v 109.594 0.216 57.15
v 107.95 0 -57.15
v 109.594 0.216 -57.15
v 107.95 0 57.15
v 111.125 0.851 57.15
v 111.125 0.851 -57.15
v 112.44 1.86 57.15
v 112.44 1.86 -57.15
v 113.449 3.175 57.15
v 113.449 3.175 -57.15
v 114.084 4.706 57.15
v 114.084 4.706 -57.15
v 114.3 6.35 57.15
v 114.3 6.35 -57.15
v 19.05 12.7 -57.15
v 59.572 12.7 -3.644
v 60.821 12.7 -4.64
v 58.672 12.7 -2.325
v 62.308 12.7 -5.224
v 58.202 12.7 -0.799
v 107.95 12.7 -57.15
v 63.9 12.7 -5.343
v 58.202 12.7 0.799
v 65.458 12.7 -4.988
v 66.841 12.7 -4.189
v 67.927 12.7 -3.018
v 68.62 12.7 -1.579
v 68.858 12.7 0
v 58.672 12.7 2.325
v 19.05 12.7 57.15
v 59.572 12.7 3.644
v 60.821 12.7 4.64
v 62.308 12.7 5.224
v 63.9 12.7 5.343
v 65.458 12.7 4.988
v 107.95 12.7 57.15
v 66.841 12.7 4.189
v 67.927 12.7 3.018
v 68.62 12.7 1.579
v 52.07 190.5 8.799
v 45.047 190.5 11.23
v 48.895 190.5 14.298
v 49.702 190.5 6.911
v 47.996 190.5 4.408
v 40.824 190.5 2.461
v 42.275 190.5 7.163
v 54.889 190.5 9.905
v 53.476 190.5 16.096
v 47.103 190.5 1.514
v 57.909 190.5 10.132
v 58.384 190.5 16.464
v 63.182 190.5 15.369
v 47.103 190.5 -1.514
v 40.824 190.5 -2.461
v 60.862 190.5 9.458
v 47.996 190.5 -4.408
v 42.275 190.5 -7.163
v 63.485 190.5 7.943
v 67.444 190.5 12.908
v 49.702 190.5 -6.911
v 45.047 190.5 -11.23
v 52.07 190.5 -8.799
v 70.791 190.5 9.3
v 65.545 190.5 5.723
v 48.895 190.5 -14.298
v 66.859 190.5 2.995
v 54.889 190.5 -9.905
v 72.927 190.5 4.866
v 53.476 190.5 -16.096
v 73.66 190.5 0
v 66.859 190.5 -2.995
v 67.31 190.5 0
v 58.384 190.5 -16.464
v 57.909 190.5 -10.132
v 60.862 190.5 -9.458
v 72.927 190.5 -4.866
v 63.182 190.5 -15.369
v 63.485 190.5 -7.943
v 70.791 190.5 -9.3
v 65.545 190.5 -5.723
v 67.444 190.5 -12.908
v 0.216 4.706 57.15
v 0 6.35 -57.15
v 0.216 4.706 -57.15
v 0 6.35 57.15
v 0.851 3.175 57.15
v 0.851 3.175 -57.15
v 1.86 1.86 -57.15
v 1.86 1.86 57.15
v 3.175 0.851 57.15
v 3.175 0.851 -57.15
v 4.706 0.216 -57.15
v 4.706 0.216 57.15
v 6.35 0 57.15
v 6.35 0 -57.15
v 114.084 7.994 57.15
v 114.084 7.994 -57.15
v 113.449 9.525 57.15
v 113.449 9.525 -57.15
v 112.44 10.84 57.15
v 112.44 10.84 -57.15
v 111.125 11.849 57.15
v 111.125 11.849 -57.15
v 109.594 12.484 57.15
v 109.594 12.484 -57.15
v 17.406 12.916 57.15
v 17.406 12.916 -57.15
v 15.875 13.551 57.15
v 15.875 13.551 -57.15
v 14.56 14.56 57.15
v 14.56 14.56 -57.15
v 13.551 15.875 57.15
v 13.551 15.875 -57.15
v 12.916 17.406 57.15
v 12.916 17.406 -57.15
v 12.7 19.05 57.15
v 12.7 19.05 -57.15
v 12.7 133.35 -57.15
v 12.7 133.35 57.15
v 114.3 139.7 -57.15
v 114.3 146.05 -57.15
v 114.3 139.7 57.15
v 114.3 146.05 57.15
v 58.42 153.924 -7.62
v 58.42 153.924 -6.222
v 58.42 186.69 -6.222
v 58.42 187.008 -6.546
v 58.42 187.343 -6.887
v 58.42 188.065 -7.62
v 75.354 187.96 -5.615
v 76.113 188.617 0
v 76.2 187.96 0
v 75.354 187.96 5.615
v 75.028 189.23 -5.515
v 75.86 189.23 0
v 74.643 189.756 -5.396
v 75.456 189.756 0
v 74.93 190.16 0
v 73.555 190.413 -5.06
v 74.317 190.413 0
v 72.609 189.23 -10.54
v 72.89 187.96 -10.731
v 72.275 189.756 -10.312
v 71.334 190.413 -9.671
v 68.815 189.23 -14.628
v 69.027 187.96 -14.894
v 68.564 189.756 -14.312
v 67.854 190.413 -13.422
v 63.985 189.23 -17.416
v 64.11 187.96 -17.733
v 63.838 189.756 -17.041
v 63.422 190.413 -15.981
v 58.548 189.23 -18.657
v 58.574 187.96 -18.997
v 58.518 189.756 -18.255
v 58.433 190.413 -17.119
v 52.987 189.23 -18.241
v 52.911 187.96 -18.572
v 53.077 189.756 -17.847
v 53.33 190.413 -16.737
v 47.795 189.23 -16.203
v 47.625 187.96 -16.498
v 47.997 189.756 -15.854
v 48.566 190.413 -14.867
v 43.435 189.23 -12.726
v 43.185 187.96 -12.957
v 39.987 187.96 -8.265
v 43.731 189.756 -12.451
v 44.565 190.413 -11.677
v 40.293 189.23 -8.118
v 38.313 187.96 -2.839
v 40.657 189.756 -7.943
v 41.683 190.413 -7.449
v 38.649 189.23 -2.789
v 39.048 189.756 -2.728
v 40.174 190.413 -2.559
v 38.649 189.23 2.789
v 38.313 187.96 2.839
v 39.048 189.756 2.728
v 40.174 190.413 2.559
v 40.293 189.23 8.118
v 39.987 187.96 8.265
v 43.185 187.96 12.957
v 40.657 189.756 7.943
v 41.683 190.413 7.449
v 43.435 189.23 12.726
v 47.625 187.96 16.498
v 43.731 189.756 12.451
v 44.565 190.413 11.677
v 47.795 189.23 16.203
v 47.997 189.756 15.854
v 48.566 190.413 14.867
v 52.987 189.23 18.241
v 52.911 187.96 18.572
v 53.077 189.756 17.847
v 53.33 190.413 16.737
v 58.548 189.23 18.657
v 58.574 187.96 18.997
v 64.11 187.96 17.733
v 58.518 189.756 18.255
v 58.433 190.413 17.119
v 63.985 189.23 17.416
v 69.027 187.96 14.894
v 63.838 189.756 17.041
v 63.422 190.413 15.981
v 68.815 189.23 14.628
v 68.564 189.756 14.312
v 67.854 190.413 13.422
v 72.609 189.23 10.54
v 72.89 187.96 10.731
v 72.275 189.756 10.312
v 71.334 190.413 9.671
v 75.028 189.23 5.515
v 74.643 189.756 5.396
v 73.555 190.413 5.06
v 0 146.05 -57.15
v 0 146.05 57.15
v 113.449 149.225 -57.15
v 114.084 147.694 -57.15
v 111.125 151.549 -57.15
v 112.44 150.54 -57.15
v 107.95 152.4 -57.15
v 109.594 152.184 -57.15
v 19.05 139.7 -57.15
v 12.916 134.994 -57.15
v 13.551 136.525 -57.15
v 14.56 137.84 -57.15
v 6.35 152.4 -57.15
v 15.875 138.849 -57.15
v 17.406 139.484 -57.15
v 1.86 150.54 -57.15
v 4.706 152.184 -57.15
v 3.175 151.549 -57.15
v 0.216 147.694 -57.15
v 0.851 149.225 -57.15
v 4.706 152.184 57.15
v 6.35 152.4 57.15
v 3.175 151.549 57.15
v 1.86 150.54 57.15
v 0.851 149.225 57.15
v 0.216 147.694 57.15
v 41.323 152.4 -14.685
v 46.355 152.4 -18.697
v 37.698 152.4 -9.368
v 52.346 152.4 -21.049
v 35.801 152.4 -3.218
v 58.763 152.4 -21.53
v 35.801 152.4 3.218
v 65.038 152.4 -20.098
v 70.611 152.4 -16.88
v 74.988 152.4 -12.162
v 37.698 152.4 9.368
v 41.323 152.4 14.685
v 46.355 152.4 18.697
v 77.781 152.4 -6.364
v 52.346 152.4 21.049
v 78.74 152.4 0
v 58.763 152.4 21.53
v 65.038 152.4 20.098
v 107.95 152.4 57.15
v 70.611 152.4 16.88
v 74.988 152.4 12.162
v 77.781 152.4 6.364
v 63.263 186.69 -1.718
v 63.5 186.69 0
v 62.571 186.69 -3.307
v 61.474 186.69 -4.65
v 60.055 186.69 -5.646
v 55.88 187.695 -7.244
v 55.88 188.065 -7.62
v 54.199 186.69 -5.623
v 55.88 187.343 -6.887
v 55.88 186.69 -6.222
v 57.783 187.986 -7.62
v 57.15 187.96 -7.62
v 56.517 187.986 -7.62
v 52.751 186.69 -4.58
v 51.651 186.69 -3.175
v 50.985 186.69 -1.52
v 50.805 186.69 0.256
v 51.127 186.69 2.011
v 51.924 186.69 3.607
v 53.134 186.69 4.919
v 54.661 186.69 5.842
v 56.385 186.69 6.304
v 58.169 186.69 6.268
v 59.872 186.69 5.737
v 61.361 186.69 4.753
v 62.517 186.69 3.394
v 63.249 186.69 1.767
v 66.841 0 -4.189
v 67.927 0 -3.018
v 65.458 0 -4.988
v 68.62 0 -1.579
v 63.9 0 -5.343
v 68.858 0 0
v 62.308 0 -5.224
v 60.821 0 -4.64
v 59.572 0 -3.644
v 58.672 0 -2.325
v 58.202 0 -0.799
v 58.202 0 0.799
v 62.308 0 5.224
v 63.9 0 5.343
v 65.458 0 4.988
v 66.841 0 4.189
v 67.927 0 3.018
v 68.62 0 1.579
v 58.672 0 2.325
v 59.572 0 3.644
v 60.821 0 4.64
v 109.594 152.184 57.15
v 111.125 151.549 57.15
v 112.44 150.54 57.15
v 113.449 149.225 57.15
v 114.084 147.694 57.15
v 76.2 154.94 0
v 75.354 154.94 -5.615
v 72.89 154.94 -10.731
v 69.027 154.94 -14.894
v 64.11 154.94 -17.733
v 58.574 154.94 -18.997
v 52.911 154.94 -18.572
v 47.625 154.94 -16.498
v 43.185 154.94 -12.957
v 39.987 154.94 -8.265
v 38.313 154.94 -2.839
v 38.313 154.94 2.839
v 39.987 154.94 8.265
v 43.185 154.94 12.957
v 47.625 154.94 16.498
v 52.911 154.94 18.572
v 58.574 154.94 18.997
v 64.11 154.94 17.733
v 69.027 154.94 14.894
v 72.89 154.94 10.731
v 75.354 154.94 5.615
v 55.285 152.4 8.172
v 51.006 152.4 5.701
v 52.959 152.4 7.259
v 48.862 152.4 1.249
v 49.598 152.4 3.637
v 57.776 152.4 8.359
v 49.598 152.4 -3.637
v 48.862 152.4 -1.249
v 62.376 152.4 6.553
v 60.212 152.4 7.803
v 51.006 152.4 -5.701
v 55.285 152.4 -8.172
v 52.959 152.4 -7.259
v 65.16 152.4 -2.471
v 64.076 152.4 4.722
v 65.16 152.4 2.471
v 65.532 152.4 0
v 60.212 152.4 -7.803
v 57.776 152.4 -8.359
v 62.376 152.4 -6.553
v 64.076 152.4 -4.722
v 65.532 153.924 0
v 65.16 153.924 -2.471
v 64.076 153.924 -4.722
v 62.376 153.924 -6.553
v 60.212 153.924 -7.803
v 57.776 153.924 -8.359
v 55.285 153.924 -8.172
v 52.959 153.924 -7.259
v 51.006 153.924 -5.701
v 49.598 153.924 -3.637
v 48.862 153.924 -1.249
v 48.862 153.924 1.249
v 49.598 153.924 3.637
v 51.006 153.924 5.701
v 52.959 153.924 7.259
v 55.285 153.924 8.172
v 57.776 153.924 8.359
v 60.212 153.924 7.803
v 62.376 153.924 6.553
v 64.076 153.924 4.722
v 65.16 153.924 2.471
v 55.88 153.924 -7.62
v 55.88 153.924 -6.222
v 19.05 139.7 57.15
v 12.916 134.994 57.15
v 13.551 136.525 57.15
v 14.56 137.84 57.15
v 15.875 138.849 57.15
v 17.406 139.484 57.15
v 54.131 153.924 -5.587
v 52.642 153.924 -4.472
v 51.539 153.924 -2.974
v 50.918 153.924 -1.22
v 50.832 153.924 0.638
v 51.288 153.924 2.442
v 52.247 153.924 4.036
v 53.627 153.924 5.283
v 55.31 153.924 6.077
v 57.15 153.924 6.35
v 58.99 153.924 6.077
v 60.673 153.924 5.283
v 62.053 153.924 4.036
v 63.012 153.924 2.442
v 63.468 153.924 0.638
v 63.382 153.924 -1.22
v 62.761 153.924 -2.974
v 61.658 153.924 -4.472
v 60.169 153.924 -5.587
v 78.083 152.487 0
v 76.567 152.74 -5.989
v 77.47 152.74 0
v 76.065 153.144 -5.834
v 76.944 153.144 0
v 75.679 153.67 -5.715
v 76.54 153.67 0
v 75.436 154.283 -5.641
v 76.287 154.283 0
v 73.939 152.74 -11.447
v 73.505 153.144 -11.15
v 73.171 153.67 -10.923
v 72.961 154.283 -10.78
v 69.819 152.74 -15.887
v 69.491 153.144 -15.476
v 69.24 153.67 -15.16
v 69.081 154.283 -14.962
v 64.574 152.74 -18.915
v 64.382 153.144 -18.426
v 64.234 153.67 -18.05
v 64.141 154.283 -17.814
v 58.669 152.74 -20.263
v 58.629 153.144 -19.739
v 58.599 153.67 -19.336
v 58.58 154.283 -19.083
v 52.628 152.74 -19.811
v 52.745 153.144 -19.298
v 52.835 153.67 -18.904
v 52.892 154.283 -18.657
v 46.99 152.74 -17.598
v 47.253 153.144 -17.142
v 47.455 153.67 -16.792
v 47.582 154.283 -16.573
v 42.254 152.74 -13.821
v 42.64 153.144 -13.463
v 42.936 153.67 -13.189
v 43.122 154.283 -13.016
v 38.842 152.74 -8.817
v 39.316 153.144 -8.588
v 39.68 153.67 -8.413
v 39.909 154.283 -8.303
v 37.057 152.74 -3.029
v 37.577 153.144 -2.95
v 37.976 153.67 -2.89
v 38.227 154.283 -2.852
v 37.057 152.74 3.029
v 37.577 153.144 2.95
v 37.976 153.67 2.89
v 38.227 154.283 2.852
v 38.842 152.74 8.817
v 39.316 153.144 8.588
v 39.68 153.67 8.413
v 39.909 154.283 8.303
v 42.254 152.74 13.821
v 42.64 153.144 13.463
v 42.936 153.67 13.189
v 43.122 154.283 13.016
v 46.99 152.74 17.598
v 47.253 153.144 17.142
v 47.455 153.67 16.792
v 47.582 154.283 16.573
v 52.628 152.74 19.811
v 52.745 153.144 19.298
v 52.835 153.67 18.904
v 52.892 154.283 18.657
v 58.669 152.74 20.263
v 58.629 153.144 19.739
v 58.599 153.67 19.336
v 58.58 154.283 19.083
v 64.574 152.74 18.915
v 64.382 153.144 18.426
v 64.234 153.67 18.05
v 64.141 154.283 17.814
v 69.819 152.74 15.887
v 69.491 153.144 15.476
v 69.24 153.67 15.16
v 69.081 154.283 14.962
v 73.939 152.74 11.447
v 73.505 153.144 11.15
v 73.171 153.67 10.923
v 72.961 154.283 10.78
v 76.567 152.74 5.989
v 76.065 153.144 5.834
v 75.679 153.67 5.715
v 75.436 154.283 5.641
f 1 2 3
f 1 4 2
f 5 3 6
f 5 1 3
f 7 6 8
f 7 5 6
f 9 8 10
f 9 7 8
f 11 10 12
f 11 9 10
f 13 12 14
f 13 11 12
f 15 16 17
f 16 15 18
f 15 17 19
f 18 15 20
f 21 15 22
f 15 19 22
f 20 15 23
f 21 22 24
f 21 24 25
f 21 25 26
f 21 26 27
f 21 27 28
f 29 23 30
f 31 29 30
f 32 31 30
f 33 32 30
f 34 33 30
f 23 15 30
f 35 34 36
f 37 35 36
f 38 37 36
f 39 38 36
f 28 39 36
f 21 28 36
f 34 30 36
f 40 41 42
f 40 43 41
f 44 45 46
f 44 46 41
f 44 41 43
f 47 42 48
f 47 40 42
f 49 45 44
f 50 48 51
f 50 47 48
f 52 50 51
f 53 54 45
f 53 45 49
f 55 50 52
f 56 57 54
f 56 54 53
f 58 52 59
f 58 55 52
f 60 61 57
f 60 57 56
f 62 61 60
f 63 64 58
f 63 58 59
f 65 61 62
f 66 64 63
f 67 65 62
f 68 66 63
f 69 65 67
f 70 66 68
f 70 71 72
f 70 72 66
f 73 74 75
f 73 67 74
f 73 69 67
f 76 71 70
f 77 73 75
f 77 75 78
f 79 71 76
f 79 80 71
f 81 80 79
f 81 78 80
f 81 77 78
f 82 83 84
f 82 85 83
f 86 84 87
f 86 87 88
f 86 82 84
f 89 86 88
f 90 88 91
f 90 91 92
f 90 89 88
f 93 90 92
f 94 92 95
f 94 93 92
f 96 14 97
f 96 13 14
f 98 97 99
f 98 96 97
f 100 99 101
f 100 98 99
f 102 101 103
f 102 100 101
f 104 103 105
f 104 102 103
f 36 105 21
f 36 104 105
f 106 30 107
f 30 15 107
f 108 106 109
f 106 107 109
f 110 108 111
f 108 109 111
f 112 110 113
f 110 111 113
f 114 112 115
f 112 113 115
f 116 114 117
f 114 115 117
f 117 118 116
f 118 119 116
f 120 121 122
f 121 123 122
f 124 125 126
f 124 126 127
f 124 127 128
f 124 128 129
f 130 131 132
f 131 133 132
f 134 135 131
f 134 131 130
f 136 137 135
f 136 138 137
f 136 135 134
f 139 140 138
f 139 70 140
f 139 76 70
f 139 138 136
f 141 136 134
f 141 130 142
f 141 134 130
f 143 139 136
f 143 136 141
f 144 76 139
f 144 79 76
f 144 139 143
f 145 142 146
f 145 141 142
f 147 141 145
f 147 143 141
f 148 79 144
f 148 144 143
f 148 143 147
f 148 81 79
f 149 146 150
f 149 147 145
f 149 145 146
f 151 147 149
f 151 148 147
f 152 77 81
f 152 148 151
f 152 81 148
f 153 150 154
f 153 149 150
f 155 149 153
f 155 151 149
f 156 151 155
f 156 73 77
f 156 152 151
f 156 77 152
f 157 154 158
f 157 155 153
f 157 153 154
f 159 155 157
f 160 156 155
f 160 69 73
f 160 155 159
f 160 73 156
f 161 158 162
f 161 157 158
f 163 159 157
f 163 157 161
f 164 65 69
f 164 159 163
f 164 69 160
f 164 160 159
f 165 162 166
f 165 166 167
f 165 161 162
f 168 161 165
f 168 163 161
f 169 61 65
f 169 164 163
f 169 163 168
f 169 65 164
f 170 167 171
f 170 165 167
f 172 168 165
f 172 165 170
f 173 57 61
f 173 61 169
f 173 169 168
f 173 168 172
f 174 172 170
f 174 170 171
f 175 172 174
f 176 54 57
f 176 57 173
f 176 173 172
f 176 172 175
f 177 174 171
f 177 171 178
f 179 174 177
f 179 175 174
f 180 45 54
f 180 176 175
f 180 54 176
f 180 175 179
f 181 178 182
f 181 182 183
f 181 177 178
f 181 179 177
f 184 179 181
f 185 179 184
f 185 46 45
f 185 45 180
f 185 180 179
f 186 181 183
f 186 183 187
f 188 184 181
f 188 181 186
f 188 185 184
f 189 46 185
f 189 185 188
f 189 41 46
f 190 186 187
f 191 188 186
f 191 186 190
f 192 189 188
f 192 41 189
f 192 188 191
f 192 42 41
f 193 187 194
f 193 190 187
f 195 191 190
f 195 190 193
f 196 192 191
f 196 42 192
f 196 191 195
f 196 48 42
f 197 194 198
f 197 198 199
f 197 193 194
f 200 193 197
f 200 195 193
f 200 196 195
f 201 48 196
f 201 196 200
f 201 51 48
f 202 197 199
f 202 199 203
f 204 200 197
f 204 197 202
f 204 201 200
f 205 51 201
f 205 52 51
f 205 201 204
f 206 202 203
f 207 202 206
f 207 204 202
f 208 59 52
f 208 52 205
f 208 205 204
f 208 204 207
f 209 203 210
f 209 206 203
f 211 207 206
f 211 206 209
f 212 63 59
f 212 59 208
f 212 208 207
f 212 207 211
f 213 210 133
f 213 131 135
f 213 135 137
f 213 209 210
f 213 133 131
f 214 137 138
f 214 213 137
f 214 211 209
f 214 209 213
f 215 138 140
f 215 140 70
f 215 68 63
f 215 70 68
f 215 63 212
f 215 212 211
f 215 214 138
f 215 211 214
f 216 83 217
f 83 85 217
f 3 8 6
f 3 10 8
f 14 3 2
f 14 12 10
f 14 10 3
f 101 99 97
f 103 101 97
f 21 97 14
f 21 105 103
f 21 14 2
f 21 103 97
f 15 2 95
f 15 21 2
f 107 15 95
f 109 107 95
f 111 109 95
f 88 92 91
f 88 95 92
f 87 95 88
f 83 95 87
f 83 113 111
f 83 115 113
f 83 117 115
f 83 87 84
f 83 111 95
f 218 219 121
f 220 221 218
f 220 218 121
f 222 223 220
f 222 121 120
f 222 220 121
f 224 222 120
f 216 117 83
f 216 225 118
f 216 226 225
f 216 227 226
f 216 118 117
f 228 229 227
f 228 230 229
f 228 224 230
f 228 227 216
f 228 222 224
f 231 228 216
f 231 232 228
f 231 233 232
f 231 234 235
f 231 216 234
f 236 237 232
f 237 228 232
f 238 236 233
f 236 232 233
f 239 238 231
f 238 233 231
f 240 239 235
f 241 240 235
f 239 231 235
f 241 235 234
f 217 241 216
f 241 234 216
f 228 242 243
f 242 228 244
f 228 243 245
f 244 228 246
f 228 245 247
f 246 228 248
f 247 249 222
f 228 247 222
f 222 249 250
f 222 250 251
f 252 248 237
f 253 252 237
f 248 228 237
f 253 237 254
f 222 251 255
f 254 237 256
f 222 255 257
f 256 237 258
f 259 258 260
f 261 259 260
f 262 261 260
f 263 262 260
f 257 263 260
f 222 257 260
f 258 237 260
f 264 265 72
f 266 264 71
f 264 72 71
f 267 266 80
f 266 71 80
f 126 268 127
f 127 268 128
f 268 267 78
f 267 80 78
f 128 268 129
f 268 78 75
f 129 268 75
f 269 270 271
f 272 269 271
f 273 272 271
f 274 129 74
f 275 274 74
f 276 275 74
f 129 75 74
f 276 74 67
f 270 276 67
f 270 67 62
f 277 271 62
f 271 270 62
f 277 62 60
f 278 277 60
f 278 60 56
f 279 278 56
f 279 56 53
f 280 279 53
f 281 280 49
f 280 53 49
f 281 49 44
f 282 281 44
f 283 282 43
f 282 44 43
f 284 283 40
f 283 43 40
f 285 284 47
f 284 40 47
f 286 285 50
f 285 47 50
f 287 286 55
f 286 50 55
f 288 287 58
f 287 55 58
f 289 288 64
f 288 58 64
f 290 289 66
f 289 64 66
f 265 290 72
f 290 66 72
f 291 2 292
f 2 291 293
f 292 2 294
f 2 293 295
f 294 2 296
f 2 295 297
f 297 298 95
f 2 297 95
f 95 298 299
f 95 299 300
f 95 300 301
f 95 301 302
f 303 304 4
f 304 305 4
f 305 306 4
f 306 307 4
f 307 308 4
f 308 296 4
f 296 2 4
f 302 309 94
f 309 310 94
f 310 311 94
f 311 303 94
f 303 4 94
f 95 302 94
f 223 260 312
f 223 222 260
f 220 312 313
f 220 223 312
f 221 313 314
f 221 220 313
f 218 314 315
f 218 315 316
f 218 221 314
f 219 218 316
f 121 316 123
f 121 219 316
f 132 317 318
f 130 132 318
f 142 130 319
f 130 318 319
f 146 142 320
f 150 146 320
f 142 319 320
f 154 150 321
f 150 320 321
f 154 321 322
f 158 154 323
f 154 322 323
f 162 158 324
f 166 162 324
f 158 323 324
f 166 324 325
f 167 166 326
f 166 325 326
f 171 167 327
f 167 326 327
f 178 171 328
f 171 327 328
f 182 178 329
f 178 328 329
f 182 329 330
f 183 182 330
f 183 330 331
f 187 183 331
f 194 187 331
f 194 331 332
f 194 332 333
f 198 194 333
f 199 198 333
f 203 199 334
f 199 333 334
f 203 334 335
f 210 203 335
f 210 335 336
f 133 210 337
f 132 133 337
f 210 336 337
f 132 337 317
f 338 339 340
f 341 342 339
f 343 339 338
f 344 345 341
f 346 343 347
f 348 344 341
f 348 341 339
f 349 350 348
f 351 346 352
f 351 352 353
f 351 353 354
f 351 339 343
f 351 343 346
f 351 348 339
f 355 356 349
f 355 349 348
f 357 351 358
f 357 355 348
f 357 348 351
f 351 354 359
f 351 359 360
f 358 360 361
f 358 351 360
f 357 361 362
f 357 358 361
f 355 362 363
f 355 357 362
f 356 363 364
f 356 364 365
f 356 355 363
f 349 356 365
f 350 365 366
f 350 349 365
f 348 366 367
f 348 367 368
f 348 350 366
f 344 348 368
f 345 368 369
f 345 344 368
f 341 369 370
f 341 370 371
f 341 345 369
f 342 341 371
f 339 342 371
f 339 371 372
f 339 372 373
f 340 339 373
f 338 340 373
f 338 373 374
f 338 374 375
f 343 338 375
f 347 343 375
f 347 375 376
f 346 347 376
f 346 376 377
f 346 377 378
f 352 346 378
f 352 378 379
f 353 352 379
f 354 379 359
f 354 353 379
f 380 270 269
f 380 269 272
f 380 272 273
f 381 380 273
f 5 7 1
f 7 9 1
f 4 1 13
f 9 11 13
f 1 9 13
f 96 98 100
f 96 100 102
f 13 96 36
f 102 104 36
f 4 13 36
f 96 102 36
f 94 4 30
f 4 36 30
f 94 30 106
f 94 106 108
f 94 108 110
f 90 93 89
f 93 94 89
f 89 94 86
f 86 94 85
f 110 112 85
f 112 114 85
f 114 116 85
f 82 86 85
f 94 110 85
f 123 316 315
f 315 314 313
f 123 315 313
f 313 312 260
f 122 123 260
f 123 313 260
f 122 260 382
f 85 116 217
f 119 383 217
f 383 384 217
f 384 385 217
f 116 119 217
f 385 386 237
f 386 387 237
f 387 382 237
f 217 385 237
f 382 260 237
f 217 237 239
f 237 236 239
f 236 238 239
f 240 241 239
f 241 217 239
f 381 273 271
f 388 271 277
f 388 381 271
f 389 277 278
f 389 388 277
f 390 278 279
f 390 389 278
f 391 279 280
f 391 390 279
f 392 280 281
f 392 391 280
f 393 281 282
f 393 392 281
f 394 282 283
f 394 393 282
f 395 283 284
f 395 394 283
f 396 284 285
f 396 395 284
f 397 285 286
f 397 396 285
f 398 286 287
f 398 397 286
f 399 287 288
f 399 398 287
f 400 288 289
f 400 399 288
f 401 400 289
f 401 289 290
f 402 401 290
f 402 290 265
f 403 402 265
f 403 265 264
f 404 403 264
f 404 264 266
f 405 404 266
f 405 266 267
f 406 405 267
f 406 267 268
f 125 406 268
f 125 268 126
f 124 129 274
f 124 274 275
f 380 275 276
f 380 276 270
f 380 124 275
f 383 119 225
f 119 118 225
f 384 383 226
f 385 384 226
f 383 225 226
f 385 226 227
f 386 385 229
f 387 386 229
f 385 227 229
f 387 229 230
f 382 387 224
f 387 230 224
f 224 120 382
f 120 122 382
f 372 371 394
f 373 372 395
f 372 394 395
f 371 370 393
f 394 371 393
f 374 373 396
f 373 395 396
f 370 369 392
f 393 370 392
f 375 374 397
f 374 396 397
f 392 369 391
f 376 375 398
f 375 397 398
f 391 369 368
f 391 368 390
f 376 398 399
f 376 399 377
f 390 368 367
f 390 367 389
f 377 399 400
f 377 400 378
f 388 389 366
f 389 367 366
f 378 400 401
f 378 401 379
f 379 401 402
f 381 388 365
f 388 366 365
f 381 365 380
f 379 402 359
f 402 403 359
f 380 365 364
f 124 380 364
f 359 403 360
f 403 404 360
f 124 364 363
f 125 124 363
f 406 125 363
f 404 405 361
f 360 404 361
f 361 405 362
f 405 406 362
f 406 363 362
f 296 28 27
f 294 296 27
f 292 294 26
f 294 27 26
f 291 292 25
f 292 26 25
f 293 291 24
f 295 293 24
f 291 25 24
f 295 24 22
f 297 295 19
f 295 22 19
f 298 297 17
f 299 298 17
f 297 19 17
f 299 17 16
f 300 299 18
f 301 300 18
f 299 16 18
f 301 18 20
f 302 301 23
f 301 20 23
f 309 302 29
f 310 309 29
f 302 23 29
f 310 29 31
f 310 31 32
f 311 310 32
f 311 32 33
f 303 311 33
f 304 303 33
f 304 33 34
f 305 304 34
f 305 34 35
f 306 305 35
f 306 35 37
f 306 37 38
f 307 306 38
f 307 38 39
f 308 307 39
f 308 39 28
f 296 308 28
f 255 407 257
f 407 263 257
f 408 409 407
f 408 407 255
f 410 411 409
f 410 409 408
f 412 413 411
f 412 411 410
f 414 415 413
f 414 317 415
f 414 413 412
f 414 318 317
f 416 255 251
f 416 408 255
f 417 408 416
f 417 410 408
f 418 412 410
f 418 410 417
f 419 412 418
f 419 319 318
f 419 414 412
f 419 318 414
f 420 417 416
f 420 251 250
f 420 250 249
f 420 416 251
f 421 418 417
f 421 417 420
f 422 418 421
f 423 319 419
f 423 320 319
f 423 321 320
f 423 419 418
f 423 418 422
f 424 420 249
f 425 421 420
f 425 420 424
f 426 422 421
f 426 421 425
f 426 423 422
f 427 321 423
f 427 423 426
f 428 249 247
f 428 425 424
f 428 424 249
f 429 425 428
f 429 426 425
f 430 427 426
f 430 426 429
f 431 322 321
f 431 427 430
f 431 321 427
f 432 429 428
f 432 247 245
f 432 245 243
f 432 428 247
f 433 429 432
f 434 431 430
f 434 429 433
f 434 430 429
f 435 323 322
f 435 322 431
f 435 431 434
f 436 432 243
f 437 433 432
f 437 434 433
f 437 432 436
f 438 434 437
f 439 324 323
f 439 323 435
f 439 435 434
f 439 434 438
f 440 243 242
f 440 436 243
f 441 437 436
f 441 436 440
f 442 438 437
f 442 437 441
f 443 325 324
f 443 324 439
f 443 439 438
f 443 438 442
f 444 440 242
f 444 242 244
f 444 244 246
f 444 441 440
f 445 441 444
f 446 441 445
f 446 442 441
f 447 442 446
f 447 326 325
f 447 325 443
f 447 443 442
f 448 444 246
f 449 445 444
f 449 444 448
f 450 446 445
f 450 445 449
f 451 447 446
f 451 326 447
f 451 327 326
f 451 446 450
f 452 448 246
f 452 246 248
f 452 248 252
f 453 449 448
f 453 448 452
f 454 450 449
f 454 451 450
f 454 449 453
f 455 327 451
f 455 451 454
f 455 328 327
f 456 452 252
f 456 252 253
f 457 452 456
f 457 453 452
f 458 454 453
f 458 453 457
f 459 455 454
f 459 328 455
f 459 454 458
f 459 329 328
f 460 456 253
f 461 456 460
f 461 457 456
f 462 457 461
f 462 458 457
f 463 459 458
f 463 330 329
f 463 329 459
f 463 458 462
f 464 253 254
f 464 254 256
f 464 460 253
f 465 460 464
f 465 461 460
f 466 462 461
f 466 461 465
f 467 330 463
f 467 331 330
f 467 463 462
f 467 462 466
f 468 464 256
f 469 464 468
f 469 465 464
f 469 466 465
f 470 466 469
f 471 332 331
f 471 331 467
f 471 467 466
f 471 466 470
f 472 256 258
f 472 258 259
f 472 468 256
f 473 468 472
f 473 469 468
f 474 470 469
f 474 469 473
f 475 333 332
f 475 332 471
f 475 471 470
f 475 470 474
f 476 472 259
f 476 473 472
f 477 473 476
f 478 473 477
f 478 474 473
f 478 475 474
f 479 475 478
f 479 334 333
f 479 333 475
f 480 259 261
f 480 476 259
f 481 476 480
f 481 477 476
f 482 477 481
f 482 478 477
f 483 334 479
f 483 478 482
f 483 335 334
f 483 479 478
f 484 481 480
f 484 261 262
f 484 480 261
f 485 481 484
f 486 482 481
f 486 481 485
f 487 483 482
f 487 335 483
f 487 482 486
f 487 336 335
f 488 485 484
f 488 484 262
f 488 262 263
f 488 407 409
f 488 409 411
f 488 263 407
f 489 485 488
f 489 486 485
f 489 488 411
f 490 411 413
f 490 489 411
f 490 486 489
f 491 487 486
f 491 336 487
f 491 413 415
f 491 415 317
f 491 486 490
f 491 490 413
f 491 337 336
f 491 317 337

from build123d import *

# Parameters (mm, degrees)
BOSS_EXTRUDE1_DEPTH         = 57.15
FILLET1_R                   = 6.35
FILLET2_R                   = 6.35
FILLET3_R                   = 6.35
F_1_2_13_TAPPED_HOLE1_D     = 10.71626
F_1_2_13_TAPPED_HOLE1_DEPTH = 12.7
SKETCH7_R                   = 19.05
BOSS_EXTRUDE2_DEPTH         = 38.1
SKETCH8_R                   = 8.382
CUT_EXTRUDE1_DEPTH          = 1.524
FILLET4_R                   = 2.54


with BuildPart() as part:
    # Sketch1 → Boss-Extrude1 (new, symmetric)
    with BuildSketch(Plane.XY):
        Polygon((0, 0), (0, 152.4), (114.3, 152.4), (114.3, 139.7), (12.7, 139.7), (12.7, 12.7), (114.3, 12.7), (114.3, 0), align=None)
    extrude(amount=BOSS_EXTRUDE1_DEPTH, both=True)

    # Fillet1
    fillet1_edges = [part.edges().sort_by_distance(p)[0] for p in [
        (12.7, 139.7, 0),
        (12.7, 12.7, 0),
    ]]
    fillet(fillet1_edges, radius=FILLET1_R)

    # Fillet2
    fillet2_edges = [part.edges().sort_by_distance(p)[0] for p in [
        (0, 0, 0),
        (0, 152.4, 0),
    ]]
    fillet(fillet2_edges, radius=FILLET2_R)

    # Fillet3
    fillet3_edges = [part.edges().sort_by_distance(p)[0] for p in [
        (114.3, 152.4, 0),
        (114.3, 12.7, 0),
        (114.3, 0, 0),
    ]]
    fillet(fillet3_edges, radius=FILLET3_R - 0.0001)  # a hair under: the kernel refuses the full size

    # 1/2-13 Tapped Hole1
    with Locations(Plane(origin=(0, 0, 0), x_dir=(-1, 0, 0), z_dir=(0, -1, 0))):
        with Locations((-63.5, 0)):
            Hole(F_1_2_13_TAPPED_HOLE1_D / 2, depth=F_1_2_13_TAPPED_HOLE1_DEPTH)

    # Sketch7 → Boss-Extrude2 (add)
    with BuildSketch(Plane(origin=(0, 152.4, 0), x_dir=(1, 0, 0), z_dir=(0, 1, 0))):
        with Locations((57.15, 0)):
            Circle(SKETCH7_R)
        with BuildLine():
            Line((58.42, 6.221703947), (58.42, 7.62))
            Line((58.42, 7.62), (55.88, 7.62))
            Line((55.88, 7.62), (55.88, 6.221703947))
            ThreePointArc((55.88, 6.221703947), (57.15, -6.35), (58.42, 6.221703947))
        make_face(mode=Mode.SUBTRACT)
    extrude(amount=BOSS_EXTRUDE2_DEPTH)

    # Sketch8 → Cut-Extrude1 (cut)
    with BuildSketch(Plane(origin=(0, 152.4, 0), x_dir=(1, 0, 0), z_dir=(0, 1, 0))):
        with Locations((57.15, 0)):
            Circle(SKETCH8_R)
    extrude(amount=CUT_EXTRUDE1_DEPTH, mode=Mode.SUBTRACT)

    # Fillet4
    fillet4_edges = [part.edges().sort_by_distance(p)[0] for p in [
        (38.1, 152.4, 0),
        (38.1, 190.5, 0),
    ]]
    fillet(fillet4_edges, radius=FILLET4_R)

    # Chamfer1: read off the stored shape, not the designer's step
    # Chamfer1 outline → Chamfer1 (revolve, cut)
    with BuildSketch(Plane(origin=(57.15, 0, 0), x_dir=(1, 0, 0), z_dir=(0, 0, 1))):
        Polygon((6.349999964, 190.5), (6.349999964, 186.689999964), (10.16, 190.5), align=None)
    revolve(axis=Axis((57.15, 0, 0), (0, 1, 0)), mode=Mode.SUBTRACT)


solid = part.part
